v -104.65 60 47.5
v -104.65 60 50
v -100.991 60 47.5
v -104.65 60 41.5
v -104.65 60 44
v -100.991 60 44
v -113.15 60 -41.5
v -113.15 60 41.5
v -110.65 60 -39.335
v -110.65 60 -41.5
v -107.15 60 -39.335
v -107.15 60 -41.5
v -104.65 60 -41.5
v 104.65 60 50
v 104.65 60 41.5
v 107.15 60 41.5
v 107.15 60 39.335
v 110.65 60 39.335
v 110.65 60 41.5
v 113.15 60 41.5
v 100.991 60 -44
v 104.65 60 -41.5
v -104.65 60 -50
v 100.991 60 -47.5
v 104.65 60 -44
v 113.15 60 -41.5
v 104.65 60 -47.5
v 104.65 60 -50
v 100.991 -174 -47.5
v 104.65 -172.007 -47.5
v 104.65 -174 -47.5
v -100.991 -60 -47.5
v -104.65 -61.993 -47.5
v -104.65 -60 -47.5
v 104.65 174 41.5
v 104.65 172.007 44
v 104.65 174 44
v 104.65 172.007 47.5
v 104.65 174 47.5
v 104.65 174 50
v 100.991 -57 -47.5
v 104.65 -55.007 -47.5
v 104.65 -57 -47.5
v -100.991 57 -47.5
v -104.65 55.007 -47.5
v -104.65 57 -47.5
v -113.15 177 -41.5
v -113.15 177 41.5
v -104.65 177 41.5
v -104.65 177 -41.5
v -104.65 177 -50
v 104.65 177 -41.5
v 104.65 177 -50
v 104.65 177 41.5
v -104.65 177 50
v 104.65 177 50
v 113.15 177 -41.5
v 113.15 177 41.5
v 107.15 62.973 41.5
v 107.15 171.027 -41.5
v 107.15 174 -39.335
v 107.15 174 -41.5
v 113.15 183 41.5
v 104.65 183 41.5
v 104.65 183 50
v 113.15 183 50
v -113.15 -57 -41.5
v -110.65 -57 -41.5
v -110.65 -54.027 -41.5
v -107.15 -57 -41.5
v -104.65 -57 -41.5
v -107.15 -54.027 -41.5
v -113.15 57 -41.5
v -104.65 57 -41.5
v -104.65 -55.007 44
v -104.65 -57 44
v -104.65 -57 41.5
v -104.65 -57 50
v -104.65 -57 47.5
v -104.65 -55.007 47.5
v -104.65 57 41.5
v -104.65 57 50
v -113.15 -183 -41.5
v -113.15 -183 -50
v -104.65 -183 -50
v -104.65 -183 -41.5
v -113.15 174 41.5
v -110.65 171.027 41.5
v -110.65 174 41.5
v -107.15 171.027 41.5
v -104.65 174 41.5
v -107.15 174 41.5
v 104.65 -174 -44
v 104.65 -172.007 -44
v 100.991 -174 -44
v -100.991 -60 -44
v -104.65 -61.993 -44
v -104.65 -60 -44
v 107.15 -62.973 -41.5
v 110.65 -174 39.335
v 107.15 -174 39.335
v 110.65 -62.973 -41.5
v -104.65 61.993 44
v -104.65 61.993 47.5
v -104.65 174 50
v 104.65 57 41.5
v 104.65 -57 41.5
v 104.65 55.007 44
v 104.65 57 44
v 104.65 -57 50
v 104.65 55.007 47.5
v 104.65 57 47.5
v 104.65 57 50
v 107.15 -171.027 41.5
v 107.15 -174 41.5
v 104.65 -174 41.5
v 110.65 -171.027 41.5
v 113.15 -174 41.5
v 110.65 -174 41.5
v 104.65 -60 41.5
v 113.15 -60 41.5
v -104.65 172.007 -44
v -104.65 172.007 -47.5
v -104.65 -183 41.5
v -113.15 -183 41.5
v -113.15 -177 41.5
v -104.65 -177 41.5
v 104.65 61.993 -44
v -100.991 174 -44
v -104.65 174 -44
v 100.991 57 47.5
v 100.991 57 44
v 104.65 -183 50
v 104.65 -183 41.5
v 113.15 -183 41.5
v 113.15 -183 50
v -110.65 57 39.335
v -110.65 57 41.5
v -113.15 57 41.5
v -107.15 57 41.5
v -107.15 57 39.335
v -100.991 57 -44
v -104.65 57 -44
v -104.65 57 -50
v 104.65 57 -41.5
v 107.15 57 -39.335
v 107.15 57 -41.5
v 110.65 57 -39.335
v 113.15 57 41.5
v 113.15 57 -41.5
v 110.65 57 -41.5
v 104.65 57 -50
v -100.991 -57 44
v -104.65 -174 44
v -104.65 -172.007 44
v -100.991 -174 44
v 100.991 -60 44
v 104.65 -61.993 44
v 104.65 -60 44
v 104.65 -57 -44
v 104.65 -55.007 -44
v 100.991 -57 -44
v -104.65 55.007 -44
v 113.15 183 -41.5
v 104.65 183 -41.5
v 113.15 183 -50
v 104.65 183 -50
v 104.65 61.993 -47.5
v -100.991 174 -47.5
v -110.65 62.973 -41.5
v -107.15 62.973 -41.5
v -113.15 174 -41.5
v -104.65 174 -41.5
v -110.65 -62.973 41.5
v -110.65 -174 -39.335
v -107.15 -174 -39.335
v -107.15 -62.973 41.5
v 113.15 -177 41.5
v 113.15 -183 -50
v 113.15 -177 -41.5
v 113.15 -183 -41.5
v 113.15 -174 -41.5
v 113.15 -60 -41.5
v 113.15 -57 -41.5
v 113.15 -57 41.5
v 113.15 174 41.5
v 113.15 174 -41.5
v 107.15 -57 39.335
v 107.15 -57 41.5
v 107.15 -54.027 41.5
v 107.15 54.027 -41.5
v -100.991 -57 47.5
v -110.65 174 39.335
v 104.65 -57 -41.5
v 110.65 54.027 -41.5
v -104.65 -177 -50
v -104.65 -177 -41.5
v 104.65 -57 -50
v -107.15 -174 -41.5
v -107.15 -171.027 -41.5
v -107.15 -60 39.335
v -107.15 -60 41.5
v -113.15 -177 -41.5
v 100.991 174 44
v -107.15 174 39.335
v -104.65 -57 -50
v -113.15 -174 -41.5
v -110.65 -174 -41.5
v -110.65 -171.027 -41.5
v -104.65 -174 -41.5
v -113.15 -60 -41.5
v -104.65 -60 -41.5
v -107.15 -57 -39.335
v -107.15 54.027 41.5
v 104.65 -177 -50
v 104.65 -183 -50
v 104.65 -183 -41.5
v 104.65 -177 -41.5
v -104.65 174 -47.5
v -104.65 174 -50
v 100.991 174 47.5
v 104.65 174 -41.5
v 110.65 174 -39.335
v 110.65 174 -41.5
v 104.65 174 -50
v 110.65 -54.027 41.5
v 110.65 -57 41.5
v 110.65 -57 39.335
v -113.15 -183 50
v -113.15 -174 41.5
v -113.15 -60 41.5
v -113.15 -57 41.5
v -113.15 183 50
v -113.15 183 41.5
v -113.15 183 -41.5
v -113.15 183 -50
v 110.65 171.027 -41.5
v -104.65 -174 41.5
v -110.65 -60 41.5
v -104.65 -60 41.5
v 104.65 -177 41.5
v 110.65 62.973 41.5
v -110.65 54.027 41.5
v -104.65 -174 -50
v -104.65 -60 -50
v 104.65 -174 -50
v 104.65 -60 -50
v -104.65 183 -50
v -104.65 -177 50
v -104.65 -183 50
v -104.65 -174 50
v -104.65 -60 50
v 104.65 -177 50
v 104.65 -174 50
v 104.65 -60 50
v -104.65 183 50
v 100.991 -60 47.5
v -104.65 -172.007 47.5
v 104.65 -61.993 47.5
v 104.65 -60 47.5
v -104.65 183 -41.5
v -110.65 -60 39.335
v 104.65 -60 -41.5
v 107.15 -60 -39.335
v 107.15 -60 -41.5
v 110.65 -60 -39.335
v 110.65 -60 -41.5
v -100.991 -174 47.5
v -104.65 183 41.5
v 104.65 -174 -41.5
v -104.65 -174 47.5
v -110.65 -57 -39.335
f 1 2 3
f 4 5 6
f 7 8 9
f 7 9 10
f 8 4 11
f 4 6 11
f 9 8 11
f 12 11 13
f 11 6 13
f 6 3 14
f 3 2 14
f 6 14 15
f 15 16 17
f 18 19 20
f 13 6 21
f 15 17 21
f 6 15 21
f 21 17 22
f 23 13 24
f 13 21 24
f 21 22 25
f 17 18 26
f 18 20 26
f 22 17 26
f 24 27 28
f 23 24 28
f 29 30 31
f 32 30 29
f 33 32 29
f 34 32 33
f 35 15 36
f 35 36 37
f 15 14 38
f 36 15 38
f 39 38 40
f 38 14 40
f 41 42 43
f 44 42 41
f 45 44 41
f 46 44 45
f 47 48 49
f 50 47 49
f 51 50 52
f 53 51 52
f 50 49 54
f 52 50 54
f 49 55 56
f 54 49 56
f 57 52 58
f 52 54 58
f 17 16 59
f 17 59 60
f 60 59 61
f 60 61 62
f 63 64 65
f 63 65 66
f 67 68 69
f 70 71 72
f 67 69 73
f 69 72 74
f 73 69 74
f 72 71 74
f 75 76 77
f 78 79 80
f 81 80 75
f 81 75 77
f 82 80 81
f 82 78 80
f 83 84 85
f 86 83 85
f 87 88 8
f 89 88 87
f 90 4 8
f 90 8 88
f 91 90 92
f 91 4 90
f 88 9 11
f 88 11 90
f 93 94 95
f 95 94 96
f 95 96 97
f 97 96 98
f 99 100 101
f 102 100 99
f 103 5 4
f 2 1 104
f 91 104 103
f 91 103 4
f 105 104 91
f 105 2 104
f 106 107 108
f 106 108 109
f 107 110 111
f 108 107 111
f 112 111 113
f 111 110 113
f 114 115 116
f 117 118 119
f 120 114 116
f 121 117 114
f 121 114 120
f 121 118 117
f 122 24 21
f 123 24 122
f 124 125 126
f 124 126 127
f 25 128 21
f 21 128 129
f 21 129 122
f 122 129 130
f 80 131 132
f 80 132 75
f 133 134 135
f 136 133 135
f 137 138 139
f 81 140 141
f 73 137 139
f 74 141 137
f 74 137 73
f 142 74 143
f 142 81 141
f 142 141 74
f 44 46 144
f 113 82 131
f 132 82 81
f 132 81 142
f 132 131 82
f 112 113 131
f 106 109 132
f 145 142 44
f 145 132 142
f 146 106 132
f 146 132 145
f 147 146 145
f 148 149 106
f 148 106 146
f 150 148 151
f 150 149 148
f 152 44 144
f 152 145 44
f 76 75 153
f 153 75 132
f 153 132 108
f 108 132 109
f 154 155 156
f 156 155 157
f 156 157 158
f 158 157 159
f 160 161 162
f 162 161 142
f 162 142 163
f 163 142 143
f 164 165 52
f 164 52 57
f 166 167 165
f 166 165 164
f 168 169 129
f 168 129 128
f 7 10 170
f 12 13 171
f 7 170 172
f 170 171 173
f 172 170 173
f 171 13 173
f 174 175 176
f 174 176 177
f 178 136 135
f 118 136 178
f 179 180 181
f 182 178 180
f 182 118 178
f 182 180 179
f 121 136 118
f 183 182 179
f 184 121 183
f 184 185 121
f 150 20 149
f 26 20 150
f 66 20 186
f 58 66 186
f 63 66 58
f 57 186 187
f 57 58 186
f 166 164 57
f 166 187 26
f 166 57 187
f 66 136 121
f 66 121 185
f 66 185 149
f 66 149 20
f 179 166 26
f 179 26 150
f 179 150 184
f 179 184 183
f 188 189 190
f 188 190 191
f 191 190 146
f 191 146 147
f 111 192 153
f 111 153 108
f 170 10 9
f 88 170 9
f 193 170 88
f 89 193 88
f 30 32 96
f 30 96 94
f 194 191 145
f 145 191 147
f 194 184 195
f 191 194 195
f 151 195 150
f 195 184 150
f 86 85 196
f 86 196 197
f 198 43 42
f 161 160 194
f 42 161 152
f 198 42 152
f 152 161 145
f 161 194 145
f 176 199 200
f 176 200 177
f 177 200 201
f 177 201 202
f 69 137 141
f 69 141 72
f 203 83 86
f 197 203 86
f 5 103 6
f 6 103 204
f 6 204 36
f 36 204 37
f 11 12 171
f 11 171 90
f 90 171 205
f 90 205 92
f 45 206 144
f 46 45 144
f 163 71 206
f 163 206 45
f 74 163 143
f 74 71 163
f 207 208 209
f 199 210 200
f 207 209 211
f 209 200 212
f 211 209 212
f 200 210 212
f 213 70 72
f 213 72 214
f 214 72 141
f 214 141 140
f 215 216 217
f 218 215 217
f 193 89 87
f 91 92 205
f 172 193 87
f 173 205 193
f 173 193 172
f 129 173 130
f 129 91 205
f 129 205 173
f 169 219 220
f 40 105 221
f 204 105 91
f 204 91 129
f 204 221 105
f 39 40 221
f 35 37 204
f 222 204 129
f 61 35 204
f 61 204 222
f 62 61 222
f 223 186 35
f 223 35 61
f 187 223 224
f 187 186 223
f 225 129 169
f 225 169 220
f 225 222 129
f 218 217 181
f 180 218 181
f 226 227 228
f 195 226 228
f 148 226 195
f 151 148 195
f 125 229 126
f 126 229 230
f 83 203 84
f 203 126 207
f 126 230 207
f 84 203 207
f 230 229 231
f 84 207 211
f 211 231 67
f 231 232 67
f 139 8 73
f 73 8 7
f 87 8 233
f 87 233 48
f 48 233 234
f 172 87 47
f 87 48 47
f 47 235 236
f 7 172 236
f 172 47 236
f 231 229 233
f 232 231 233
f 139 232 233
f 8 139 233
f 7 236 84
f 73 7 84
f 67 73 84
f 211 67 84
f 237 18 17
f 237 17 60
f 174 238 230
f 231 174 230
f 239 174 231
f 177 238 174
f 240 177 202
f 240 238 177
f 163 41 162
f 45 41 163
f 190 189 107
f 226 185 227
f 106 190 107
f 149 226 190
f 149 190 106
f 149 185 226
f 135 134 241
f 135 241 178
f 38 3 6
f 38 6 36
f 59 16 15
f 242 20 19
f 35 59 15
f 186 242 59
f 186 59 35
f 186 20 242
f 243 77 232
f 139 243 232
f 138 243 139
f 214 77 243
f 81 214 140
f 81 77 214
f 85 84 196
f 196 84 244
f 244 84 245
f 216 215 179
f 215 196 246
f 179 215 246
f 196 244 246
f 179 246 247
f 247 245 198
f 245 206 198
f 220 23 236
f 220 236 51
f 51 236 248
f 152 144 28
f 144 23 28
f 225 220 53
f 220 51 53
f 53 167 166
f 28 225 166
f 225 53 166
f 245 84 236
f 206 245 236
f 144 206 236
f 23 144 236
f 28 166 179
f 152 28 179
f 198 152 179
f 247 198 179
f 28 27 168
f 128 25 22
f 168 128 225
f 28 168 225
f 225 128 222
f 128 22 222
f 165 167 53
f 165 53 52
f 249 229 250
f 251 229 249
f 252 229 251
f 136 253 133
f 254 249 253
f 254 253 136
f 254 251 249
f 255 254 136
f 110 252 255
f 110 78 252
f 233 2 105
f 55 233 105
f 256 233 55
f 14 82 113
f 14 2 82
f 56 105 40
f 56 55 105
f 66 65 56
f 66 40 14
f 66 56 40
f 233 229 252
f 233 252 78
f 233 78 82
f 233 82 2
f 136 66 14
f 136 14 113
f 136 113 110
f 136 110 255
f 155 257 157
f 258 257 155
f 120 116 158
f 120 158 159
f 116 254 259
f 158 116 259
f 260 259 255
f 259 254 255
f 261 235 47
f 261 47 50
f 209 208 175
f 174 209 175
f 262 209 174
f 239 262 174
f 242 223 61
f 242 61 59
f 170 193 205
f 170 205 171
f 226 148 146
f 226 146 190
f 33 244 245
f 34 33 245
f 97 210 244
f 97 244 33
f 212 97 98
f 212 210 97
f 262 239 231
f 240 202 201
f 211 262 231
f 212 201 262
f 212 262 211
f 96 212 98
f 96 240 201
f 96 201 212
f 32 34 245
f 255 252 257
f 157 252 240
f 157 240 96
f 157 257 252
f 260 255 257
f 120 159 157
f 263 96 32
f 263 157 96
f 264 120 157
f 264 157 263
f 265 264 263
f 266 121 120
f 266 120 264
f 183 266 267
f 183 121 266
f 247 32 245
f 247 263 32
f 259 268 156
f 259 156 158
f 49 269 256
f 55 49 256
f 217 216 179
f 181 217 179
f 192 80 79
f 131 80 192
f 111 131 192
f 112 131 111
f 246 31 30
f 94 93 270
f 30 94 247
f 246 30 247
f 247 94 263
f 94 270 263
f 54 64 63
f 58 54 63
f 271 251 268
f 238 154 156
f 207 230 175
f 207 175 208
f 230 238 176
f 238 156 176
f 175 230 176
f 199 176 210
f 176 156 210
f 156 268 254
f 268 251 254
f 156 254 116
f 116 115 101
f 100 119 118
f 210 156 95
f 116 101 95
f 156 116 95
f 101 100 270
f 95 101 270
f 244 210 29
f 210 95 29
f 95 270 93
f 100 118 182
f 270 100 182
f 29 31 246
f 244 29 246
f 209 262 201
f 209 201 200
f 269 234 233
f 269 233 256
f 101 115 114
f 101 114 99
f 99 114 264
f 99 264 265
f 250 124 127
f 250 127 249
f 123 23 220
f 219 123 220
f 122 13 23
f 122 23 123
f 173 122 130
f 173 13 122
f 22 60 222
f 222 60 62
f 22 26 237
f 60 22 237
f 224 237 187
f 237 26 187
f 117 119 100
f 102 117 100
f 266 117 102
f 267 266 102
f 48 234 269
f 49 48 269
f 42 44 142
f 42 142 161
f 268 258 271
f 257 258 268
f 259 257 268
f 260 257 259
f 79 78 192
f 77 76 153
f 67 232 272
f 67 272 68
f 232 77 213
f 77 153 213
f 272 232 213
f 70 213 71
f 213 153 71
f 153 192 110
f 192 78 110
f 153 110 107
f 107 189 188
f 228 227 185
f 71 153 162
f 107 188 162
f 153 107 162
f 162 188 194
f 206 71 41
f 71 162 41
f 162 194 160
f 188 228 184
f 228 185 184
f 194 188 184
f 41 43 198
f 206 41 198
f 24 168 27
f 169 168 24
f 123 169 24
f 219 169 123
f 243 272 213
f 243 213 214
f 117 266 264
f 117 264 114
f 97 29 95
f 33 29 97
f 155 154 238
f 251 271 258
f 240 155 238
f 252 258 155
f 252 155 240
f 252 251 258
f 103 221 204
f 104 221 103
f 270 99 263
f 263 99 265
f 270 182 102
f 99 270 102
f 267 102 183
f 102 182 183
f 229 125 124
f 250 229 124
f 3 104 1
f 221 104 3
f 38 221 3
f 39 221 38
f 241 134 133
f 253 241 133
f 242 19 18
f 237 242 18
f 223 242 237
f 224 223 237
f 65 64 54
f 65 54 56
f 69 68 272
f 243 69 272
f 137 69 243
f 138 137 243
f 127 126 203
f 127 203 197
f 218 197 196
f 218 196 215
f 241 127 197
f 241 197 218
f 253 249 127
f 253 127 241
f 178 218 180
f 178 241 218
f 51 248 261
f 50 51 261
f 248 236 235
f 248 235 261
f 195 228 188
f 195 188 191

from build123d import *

# Parameters (mm, degrees)
SKETCH2_W           = 226.3
SKETCH2_H           = 100
BOSS_EXTRUDE1_DEPTH = 183
SKETCH4_OUTSIDE_W   = 316.656
SKETCH4_OUTSIDE_H   = 190.356
SKETCH4_OUTSIDE_W_2 = 8.5
SKETCH4_OUTSIDE_H_2 = 8.5
CUT_EXTRUDE1_DEPTH  = 6
SKETCH5_W           = 209.3
SKETCH5_H           = 114
CUT_EXTRUDE2_DEPTH  = 238.259188442
SKETCH6_W           = 83
SKETCH6_H           = 114
CUT_EXTRUDE3_DEPTH  = 296.29762952
EXTRUDE_THIN1_START = -2.5
EXTRUDE_THIN1_DEPTH = 3.5
EXTRUDE_THIN2_START = -2.5
EXTRUDE_THIN2_DEPTH = 3.5
CIRPATTERN1_COUNT   = 2


with BuildPart() as part:
    # Sketch2 → Boss-Extrude1 (new, symmetric)
    with BuildSketch(Plane(origin=(0, 0, 0), x_dir=(1, 0, 0), z_dir=(0, 1, 0))):
        Rectangle(SKETCH2_W, SKETCH2_H)
    extrude(amount=BOSS_EXTRUDE1_DEPTH, both=True)

    # Sketch4 outside → Cut-Extrude1 (cut)
    with BuildSketch(Plane.XZ.offset(183)):
        Rectangle(SKETCH4_OUTSIDE_W, SKETCH4_OUTSIDE_H)
        with Locations((-108.9, 45.75)):
            Rectangle(SKETCH4_OUTSIDE_W_2, SKETCH4_OUTSIDE_H_2, mode=Mode.SUBTRACT)
        with Locations((-108.9, -45.75)):
            Rectangle(SKETCH4_OUTSIDE_W_2, SKETCH4_OUTSIDE_H_2, mode=Mode.SUBTRACT)
        with Locations((108.9, -45.75)):
            Rectangle(SKETCH4_OUTSIDE_W_2, SKETCH4_OUTSIDE_H_2, mode=Mode.SUBTRACT)
        with Locations((108.9, 45.75)):
            Rectangle(SKETCH4_OUTSIDE_W_2, SKETCH4_OUTSIDE_H_2, mode=Mode.SUBTRACT)
    cut_extrude1 = extrude(amount=-CUT_EXTRUDE1_DEPTH, mode=Mode.SUBTRACT)

    # Mirror1: Cut-Extrude1 across plane
    add(cut_extrude1.mirror(Plane.ZX), mode=Mode.SUBTRACT)

    # Sketch5 → Cut-Extrude2 (cut, through all)
    with BuildSketch(Plane.XY.offset(50)):
        with Locations((0, 117)):
            Rectangle(SKETCH5_W, SKETCH5_H)
        with Locations((0, -117)):
            Rectangle(SKETCH5_W, SKETCH5_H)
        Rectangle(SKETCH5_W, SKETCH5_H)
    extrude(amount=-CUT_EXTRUDE2_DEPTH, mode=Mode.SUBTRACT)

    # Sketch6 → Cut-Extrude3 (cut, through all)
    with BuildSketch(Plane(origin=(113.15, 0, 0), x_dir=(0, 0, -1), z_dir=(1, 0, 0))):
        with Locations((0, 117)):
            Rectangle(SKETCH6_W, SKETCH6_H)
        with Locations((0, -117)):
            Rectangle(SKETCH6_W, SKETCH6_H)
        Rectangle(SKETCH6_W, SKETCH6_H)
    extrude(amount=-CUT_EXTRUDE3_DEPTH, mode=Mode.SUBTRACT)

    # Sketch7 → Extrude-Thin1 (add)
    with BuildSketch(Plane.XY.offset(50).offset(EXTRUDE_THIN1_START)):
        Polygon((-103.812934943, -175.536822075), (105.487065057, -61.536822075), (103.812934943, -58.463177925), (-105.487065057, -172.463177925), align=None)
        Polygon((-103.812934943, -58.536822075), (105.487065057, 55.463177925), (103.812934943, 58.536822075), (-105.487065057, -55.463177925), align=None)
        Polygon((-103.812934943, 58.463177925), (105.487065057, 172.463177925), (103.812934943, 175.536822075), (-105.487065057, 61.536822075), align=None)
    extrude_thin1 = extrude(amount=-EXTRUDE_THIN1_DEPTH)

    # Sketch8 → Extrude-Thin2 (add)
    with BuildSketch(Plane(origin=(113.15, 0, 0), x_dir=(0, 0, -1), z_dir=(1, 0, 0)).offset(EXTRUDE_THIN2_START)):
        Polygon((-40.085248698, -175.030038229), (42.914751302, -61.030038229), (40.085248698, -58.969961771), (-42.914751302, -172.969961771), align=None)
        Polygon((-40.085248698, -58.030038229), (42.914751302, 55.969961771), (40.085248698, 58.030038229), (-42.914751302, -55.969961771), align=None)
        Polygon((-40.085248698, 58.969961771), (42.914751302, 172.969961771), (40.085248698, 175.030038229), (-42.914751302, 61.030038229), align=None)
    extrude_thin2 = extrude(amount=-EXTRUDE_THIN2_DEPTH)

    # CirPattern1: Extrude-Thin1, Extrude-Thin2 ×2 about axis
    cirpattern1_axis = Axis((0, -201.3, 0), (0, 1, 0))
    add([extrude_thin1.rotate(cirpattern1_axis, i * 360 / CIRPATTERN1_COUNT) for i in range(1, CIRPATTERN1_COUNT)])
    add([extrude_thin2.rotate(cirpattern1_axis, i * 360 / CIRPATTERN1_COUNT) for i in range(1, CIRPATTERN1_COUNT)])


solid = part.part
